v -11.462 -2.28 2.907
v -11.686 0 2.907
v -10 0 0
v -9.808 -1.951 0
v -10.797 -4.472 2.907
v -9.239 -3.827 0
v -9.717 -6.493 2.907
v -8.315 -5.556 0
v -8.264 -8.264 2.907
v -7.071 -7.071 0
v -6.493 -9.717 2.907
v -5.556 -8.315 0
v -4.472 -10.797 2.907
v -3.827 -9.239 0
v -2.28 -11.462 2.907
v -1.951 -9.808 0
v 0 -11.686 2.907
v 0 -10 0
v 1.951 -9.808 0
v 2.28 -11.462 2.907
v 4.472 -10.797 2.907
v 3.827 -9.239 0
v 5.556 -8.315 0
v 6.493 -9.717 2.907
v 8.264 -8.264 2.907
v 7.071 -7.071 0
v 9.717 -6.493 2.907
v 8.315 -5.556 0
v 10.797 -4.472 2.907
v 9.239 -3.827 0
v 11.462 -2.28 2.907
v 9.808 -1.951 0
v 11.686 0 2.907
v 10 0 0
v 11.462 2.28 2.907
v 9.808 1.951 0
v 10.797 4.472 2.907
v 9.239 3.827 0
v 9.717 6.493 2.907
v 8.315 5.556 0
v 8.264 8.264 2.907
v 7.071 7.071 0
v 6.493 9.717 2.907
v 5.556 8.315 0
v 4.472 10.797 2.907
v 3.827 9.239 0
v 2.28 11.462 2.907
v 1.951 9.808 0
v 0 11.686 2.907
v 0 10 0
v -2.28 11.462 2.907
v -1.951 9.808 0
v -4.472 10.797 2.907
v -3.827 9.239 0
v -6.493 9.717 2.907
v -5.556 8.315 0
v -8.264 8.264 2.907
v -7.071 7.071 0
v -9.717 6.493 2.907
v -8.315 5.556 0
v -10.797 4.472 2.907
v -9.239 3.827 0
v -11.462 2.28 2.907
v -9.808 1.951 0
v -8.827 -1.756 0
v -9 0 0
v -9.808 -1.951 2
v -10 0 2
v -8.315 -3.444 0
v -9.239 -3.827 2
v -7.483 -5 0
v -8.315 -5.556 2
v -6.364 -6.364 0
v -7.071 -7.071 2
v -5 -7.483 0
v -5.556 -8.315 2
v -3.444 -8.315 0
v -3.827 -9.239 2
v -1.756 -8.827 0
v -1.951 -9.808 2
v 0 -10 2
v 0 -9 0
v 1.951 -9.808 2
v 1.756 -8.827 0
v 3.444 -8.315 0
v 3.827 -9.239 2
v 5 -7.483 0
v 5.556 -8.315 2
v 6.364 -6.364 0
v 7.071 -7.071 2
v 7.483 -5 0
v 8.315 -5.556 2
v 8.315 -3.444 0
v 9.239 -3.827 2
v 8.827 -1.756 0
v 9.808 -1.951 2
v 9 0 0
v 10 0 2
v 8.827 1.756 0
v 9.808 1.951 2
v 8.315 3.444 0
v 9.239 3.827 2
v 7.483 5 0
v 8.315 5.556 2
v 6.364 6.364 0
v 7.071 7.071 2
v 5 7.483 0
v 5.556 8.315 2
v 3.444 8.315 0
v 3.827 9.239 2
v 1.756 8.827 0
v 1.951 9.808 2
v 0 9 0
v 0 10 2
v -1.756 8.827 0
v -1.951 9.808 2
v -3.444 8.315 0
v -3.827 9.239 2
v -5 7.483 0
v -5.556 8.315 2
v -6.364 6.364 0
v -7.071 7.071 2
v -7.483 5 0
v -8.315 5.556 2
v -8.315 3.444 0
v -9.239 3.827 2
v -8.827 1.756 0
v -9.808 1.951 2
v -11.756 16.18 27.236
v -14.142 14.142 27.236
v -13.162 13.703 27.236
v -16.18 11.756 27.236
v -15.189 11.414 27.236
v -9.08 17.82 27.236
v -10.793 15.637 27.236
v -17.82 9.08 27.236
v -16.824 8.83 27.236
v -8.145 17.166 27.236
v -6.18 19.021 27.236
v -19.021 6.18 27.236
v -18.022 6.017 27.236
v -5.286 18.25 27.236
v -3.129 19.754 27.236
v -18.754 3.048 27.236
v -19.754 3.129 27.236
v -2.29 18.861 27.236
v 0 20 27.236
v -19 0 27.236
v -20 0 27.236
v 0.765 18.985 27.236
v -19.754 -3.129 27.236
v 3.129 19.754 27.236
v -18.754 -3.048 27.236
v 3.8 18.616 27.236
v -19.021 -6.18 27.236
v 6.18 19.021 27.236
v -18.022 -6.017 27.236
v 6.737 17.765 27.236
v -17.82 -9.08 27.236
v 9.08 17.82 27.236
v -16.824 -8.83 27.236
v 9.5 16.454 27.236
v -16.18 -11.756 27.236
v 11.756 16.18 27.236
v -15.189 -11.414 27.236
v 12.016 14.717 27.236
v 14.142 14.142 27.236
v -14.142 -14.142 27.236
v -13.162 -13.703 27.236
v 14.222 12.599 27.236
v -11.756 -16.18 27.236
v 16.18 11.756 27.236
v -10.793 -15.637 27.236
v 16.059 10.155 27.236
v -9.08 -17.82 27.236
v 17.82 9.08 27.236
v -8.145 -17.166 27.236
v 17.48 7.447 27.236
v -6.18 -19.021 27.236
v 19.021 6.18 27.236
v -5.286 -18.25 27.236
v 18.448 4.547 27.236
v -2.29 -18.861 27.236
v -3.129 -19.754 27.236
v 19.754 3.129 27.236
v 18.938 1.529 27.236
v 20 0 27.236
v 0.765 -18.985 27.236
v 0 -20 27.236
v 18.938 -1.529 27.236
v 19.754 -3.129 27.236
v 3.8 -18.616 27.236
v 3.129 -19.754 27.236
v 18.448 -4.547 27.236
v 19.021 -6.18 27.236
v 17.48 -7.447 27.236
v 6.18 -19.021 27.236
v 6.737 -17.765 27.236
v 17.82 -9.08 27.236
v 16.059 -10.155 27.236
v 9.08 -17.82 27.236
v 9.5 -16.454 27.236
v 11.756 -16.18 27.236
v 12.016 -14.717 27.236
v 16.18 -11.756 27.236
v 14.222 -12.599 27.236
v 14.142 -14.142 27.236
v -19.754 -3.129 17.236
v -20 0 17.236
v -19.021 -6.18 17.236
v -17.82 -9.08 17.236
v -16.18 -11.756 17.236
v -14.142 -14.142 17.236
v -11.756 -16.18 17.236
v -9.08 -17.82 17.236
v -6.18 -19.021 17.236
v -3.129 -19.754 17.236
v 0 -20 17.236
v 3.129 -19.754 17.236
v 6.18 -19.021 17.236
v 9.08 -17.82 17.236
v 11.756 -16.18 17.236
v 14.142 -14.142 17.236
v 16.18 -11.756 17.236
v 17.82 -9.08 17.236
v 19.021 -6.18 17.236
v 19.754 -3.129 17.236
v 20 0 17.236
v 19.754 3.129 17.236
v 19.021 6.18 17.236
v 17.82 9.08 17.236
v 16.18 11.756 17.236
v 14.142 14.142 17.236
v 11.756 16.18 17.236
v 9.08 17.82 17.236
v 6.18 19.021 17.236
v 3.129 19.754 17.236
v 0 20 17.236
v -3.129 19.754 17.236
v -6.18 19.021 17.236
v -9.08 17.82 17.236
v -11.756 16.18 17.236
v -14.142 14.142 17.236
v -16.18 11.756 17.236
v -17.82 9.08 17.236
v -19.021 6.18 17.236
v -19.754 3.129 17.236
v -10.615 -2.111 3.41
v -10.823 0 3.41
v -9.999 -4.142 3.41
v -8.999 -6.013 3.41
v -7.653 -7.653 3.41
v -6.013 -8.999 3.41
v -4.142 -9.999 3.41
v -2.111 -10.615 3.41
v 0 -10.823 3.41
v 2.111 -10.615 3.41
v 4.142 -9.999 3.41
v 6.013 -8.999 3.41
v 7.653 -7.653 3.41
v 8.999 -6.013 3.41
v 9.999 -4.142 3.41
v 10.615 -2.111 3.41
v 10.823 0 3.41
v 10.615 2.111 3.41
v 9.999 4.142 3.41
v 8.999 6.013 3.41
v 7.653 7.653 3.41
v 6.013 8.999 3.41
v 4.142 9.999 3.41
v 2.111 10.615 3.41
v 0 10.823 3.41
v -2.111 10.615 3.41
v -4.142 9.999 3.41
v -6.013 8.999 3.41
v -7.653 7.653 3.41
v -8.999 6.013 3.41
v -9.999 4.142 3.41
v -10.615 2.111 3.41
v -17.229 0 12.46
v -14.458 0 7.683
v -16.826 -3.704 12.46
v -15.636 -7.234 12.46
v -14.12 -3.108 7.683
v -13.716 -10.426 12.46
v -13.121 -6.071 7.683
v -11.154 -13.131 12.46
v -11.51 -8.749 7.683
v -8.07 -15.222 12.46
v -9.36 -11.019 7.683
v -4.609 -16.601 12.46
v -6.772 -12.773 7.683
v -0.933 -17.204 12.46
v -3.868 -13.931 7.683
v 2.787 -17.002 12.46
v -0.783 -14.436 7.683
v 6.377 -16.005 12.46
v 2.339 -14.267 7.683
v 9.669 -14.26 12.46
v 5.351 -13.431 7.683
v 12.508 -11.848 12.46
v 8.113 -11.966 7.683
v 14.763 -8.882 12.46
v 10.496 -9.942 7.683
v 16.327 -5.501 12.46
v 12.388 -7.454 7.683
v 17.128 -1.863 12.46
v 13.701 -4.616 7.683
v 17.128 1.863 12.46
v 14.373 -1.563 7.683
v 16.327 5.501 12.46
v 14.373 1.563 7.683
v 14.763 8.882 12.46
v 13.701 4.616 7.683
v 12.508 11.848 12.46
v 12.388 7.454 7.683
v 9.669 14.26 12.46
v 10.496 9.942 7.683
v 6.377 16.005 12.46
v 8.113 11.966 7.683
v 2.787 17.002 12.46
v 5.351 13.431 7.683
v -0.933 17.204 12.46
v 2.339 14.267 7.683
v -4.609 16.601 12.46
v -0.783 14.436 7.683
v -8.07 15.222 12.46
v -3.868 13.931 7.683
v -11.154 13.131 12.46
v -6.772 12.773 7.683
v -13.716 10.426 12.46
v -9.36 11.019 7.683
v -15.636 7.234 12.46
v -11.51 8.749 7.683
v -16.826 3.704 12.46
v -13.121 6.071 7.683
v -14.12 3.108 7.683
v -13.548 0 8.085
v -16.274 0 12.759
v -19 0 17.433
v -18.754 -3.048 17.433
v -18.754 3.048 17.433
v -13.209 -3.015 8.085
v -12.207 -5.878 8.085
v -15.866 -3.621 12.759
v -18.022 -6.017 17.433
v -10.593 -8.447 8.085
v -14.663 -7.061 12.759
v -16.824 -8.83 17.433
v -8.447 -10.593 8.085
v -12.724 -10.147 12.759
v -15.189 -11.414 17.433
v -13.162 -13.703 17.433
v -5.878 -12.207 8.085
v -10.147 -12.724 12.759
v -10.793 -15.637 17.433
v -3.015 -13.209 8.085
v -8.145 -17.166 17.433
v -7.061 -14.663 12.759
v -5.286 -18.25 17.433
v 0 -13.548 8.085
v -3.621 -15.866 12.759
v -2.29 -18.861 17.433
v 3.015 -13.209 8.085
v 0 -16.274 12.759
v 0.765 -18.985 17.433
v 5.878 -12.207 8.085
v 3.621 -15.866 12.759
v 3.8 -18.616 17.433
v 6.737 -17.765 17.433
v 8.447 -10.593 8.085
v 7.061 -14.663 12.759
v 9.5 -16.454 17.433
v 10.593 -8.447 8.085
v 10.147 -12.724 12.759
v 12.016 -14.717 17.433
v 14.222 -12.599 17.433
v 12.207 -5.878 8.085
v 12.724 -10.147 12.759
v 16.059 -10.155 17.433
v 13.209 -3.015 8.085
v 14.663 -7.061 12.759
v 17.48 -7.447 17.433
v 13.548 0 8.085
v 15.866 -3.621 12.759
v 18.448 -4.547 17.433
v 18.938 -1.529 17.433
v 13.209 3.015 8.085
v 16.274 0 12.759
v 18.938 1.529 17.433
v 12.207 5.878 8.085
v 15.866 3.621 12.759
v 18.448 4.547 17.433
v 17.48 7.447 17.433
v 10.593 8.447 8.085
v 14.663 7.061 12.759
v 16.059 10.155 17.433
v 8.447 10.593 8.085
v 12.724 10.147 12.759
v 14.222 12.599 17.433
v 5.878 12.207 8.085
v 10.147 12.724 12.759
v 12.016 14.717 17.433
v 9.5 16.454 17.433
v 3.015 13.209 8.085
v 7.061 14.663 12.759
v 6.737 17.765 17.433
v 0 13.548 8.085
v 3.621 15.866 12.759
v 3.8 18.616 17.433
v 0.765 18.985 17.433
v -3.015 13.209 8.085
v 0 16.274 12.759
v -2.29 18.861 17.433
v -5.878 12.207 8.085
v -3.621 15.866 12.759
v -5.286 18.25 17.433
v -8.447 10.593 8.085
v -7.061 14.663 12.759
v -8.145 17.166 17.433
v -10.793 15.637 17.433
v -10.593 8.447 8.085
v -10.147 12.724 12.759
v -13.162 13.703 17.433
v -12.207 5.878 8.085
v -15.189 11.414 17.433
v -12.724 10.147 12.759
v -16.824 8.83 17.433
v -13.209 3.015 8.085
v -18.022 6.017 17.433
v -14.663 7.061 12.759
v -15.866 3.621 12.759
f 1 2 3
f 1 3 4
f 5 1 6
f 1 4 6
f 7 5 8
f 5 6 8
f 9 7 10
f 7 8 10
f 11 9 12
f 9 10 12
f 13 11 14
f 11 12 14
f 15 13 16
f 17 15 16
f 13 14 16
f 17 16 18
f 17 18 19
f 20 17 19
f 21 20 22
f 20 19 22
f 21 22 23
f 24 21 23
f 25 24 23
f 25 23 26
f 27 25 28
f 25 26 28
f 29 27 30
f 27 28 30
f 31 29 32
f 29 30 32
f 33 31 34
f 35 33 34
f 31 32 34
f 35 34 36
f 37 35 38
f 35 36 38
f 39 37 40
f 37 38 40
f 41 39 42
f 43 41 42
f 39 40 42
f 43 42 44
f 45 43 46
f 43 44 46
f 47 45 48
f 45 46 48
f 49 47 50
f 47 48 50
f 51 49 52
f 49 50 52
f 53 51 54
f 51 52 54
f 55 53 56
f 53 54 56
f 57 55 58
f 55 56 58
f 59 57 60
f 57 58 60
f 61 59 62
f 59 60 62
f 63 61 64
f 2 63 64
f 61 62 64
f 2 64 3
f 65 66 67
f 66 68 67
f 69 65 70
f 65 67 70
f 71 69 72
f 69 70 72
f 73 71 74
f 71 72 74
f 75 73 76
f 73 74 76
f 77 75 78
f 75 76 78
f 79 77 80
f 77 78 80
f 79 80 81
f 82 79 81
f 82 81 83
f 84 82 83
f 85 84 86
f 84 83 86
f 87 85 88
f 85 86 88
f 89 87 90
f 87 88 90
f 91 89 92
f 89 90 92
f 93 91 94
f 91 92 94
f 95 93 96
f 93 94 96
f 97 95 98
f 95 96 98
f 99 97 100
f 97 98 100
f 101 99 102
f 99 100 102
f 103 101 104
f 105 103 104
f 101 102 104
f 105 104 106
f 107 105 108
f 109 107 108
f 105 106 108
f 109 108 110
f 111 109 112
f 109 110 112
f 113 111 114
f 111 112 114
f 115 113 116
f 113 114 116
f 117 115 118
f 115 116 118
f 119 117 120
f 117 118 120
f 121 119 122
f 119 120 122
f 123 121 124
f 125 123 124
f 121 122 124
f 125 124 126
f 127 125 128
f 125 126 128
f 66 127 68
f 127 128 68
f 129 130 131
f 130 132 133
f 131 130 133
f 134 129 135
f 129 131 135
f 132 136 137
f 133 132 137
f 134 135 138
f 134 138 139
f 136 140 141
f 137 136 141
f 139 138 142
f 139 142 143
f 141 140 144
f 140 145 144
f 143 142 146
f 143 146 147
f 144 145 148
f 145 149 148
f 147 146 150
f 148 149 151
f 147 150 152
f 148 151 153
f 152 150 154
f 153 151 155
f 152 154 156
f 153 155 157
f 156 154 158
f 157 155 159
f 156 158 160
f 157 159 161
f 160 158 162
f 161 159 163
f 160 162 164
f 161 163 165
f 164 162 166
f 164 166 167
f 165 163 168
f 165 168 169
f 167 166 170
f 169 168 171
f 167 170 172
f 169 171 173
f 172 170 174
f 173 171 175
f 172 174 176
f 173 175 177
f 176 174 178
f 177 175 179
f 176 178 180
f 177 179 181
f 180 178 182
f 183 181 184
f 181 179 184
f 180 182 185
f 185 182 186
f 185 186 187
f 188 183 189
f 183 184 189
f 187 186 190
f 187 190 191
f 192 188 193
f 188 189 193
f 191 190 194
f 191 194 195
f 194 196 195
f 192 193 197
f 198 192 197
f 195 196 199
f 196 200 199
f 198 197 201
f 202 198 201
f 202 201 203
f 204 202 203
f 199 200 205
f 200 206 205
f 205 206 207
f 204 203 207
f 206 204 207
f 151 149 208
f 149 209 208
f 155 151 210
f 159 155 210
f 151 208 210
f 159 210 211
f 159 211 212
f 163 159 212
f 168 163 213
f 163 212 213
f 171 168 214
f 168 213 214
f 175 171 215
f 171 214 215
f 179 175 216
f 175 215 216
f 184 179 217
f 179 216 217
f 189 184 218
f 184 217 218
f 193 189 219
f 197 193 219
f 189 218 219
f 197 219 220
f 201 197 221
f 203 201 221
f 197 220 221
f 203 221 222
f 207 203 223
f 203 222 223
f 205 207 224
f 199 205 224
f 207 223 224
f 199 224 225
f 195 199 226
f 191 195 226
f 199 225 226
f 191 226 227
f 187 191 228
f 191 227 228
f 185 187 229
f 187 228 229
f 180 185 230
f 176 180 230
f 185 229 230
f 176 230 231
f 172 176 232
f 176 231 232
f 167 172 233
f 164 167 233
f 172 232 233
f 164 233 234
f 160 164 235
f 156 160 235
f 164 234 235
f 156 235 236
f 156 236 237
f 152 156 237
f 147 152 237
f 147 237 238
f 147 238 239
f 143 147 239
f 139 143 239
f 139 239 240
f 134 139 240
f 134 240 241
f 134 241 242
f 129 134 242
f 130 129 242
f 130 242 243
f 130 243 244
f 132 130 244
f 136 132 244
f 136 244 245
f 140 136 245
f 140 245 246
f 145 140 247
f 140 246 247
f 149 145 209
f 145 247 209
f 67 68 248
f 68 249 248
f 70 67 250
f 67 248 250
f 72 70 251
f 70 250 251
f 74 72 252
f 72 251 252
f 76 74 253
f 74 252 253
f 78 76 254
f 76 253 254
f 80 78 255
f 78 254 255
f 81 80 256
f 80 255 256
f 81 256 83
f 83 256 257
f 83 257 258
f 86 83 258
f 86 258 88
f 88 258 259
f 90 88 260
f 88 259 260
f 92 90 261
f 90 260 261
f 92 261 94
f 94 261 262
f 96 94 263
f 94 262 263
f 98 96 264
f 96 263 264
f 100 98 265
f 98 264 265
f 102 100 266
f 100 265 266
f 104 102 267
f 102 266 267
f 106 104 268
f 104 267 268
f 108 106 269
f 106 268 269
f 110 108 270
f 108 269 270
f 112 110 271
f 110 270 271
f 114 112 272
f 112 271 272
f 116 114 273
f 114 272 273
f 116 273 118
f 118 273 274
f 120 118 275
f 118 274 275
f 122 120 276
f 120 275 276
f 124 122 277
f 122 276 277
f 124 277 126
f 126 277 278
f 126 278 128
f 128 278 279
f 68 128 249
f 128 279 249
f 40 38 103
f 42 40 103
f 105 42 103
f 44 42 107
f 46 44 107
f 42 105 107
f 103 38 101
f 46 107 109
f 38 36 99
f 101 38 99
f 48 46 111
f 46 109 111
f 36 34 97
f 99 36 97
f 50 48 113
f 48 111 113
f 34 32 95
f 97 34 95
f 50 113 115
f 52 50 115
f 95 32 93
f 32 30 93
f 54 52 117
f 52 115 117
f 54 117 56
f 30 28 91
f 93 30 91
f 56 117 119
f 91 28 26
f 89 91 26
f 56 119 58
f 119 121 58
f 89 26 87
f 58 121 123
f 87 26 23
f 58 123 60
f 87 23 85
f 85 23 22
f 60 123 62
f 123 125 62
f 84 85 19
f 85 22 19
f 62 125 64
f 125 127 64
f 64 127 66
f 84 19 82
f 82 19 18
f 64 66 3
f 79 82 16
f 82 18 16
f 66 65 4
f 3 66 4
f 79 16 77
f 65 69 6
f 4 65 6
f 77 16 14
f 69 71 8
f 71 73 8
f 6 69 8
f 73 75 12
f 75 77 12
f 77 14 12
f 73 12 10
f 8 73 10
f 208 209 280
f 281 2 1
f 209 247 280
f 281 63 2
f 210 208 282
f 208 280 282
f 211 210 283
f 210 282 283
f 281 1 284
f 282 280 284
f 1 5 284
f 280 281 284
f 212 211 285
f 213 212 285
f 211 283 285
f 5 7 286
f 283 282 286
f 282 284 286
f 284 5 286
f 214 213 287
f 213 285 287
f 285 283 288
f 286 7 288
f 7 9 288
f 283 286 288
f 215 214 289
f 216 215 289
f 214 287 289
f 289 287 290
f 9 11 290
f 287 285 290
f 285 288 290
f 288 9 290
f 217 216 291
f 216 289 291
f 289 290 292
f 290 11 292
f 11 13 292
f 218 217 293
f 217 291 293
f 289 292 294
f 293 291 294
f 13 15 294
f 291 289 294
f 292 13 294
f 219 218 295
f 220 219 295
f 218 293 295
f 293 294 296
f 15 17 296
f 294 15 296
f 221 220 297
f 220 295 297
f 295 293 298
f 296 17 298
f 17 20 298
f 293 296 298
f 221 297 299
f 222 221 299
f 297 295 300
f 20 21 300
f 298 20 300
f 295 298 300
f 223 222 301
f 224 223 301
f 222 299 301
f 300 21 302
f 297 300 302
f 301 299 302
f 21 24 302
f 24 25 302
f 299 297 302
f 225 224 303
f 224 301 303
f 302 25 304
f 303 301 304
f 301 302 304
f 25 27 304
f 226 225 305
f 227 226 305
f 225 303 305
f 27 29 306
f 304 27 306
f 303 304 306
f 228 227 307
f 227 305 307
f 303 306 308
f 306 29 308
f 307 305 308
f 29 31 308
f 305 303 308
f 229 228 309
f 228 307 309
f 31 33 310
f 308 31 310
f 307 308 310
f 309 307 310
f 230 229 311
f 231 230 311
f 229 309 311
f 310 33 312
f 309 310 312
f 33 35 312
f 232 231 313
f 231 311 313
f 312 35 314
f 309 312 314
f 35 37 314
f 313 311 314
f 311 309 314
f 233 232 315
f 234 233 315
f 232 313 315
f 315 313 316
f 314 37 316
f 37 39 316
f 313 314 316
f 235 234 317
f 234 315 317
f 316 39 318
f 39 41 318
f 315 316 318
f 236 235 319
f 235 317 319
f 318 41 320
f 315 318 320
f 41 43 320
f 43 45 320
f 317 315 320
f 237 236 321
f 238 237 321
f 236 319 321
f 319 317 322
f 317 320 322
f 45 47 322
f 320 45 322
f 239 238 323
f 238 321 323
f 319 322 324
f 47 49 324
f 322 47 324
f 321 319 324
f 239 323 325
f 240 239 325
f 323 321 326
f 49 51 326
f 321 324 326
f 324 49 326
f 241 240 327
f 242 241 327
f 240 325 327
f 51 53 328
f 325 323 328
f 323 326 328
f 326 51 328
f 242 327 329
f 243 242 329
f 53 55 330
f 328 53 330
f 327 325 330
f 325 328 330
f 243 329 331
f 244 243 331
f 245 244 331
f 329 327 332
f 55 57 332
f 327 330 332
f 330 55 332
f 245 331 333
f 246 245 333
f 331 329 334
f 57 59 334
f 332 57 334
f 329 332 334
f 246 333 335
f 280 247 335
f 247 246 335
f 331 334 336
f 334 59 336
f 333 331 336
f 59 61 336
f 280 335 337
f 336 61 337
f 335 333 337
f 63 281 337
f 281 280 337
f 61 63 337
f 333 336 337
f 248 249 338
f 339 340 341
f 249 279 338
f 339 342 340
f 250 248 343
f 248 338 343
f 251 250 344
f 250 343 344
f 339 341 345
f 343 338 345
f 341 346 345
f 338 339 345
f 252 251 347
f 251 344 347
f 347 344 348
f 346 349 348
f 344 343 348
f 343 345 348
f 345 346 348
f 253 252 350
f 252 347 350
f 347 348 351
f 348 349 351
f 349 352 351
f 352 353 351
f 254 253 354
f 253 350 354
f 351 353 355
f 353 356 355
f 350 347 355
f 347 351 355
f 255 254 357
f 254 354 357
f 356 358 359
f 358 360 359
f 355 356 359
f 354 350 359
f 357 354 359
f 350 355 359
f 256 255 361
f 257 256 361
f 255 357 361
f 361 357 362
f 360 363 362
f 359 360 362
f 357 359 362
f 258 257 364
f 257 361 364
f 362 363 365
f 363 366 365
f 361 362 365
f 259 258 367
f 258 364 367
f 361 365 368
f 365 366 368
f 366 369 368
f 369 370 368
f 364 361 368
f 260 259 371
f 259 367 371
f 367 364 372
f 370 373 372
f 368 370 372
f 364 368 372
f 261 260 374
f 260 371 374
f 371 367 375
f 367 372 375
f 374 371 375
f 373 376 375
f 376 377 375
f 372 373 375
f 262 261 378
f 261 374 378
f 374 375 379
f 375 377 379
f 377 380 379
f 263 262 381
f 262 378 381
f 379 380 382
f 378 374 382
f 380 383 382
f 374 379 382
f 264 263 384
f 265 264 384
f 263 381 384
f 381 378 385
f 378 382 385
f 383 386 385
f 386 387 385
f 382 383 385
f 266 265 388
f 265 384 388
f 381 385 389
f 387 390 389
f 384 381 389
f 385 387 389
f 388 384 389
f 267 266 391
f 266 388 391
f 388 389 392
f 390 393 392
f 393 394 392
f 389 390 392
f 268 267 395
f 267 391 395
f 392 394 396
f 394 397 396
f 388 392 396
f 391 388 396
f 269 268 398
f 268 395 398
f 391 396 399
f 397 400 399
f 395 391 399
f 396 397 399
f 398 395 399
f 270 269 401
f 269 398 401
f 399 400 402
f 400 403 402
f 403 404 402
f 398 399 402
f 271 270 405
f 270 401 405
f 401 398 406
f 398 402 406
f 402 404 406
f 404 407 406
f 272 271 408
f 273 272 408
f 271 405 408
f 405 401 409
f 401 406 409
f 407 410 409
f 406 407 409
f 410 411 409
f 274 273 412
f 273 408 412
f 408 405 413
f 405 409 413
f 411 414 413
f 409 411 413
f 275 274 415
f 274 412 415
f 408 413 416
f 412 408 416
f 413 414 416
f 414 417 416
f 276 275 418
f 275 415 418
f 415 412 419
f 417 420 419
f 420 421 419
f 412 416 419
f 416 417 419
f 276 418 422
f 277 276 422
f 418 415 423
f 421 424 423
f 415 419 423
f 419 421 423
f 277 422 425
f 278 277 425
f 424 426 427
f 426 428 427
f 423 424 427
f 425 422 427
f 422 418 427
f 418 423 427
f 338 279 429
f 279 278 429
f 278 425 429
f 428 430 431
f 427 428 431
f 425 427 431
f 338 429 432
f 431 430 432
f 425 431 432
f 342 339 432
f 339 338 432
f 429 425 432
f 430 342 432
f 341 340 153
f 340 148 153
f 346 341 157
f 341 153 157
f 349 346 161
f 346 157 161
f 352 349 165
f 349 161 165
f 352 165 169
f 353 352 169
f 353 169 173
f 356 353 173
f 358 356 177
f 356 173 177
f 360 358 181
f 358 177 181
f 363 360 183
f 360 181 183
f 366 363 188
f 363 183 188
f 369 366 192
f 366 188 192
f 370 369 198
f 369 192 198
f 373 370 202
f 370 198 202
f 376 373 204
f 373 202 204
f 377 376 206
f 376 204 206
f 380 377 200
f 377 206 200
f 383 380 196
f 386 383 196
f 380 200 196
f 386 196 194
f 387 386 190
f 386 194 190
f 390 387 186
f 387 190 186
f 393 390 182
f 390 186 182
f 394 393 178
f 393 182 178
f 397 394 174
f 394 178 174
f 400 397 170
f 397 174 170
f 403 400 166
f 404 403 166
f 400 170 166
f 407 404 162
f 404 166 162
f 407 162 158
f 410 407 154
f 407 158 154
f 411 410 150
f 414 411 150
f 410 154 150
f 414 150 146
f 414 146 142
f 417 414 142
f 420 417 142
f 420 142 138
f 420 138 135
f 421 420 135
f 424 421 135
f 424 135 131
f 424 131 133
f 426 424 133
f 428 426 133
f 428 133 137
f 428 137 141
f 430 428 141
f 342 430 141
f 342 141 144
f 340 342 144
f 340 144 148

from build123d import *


with BuildPart() as f1:
    # F0 (on Front) → F1 (revolve)
    with BuildSketch(Plane.XZ):
        Polygon((-10, 0), (-9, 0), (-10, 2), align=None)
        Polygon((-11.686377, 2.906691), (-10, 0), (-10, 2), (-10.822537, 3.410457), align=None)
        Polygon((-20, 17.236307), (-11.686377, 2.906691), (-10.822537, 3.410457), (-19, 17.432883), (-19, 27.236307), (-20, 27.236307), align=None)
    revolve(axis=Axis((0, 0, 8.290515), (0, 0, 1)))


solid = f1.part
